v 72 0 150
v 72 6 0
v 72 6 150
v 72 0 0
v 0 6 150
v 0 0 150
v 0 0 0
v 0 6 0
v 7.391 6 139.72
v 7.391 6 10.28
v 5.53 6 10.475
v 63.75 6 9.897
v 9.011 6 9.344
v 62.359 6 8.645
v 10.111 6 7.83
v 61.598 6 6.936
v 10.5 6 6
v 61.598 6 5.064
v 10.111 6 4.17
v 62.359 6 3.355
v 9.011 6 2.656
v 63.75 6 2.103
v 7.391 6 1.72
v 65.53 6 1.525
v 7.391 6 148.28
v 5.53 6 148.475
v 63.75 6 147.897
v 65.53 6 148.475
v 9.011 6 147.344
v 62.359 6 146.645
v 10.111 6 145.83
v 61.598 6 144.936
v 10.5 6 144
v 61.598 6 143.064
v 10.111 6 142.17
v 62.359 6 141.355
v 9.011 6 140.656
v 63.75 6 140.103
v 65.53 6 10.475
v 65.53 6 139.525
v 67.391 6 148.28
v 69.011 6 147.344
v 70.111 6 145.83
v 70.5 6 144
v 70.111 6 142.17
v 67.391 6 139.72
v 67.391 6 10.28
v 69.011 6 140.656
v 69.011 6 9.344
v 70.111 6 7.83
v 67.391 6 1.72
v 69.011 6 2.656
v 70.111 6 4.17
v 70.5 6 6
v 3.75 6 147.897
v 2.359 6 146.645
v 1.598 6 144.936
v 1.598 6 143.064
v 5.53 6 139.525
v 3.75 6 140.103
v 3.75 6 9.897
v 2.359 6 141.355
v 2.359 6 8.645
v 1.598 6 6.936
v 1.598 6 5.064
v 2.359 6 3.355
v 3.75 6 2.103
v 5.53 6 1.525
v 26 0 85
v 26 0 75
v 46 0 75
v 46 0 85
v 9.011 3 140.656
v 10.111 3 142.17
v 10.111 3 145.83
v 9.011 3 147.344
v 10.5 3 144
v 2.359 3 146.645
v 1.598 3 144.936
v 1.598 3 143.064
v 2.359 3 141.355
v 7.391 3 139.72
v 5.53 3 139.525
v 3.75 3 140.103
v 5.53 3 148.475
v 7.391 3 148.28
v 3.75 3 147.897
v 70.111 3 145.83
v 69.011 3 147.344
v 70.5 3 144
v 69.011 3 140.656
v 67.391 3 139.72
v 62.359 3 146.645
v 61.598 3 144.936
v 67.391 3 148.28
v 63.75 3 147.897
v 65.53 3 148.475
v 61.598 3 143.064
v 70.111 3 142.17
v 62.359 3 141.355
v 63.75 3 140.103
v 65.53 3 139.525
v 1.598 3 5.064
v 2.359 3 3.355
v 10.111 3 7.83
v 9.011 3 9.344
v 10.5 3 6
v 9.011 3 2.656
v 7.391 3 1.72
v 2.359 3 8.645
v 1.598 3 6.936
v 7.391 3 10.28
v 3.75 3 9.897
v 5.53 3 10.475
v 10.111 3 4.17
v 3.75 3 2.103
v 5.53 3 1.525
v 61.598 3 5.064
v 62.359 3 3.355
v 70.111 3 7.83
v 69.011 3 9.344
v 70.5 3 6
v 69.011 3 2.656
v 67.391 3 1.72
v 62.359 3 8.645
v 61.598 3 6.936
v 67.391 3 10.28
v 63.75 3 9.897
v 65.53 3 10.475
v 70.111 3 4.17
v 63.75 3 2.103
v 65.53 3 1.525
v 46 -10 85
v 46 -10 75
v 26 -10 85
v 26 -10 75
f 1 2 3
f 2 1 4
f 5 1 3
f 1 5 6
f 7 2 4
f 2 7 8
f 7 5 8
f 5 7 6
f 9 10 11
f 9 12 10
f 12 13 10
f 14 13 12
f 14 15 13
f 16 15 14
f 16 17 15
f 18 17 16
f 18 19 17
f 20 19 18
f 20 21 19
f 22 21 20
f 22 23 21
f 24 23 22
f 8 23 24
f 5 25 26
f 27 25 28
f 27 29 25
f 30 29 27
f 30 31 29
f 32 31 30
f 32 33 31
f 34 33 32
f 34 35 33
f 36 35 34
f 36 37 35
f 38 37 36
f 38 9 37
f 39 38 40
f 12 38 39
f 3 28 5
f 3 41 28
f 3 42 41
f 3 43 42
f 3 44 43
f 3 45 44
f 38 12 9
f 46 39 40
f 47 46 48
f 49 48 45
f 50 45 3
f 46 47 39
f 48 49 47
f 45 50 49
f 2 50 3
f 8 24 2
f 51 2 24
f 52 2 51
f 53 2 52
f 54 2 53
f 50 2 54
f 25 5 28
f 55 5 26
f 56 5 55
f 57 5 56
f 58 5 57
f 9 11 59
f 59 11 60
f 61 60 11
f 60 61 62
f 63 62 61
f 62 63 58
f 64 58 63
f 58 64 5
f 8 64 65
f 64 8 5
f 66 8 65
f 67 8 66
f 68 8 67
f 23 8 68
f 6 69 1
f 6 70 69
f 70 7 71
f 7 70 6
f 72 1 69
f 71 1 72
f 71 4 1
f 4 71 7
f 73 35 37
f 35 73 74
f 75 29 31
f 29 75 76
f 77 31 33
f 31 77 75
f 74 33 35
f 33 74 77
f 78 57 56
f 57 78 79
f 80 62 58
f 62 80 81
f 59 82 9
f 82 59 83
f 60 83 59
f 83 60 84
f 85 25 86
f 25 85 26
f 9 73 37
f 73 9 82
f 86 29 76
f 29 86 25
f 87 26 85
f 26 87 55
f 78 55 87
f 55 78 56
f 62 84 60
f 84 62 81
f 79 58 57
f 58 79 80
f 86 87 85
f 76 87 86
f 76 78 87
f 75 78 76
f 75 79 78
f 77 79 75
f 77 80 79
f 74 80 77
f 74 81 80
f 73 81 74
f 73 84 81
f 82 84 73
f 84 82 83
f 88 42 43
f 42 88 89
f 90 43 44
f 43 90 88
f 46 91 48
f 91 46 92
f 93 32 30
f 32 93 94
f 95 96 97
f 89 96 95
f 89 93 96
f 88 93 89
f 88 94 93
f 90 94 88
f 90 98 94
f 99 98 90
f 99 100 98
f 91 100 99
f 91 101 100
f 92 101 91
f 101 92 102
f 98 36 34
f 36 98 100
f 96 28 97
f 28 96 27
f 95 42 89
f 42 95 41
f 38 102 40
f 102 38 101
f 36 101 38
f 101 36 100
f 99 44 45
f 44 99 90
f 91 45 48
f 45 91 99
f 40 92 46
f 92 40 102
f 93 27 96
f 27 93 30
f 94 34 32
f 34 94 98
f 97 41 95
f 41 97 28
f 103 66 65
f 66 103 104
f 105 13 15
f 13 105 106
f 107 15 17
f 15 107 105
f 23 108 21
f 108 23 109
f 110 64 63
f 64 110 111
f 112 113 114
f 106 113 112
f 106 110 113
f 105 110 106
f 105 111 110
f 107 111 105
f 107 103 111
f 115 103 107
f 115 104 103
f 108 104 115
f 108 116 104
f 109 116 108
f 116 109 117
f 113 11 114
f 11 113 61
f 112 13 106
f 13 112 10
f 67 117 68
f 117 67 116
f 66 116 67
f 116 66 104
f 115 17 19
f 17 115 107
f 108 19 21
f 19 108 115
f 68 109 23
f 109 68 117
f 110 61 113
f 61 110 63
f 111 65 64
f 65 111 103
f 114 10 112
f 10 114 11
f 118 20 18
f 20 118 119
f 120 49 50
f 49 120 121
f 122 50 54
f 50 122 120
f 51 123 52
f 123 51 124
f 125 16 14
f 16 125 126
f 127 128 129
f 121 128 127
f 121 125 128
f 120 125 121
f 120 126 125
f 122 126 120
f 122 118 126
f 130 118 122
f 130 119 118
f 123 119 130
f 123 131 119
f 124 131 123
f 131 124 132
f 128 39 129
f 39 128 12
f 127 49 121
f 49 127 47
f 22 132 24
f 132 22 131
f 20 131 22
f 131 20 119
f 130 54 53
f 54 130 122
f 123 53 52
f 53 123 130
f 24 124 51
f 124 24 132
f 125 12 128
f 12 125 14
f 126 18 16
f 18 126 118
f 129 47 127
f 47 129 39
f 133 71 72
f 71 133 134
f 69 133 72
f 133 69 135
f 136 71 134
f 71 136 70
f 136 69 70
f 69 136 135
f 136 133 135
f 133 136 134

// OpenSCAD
BoxH=150;
BoxW=72;
BoxD=6;
MagnetD=9;
MagnetH=4;
MagnetR=ceil(MagnetD/2)+1;
KnobH=10;
KnobW=20;
KnobD=10;
difference()
{
  cube([BoxW,BoxD,BoxH]);
  translate([MagnetR,BoxD+1,BoxH-MagnetR]) rotate([90,0,0])
    cylinder(d=MagnetD,h=MagnetH);
  translate([BoxW-MagnetR,BoxD+1,BoxH-MagnetR]) rotate([90,0,0])
    cylinder(d=MagnetD, h=MagnetH);
  translate([MagnetR,BoxD+1,MagnetR]) rotate([90,0,0])
    cylinder(d=MagnetD,h=MagnetH);
  translate([BoxW-MagnetR,BoxD+1,MagnetR]) rotate([90,0,0])
    cylinder(d=MagnetD, h=MagnetH);  
}
translate([BoxW/2-KnobW/2,-KnobD,BoxH/2]) cube([KnobW,KnobD,KnobH]);
